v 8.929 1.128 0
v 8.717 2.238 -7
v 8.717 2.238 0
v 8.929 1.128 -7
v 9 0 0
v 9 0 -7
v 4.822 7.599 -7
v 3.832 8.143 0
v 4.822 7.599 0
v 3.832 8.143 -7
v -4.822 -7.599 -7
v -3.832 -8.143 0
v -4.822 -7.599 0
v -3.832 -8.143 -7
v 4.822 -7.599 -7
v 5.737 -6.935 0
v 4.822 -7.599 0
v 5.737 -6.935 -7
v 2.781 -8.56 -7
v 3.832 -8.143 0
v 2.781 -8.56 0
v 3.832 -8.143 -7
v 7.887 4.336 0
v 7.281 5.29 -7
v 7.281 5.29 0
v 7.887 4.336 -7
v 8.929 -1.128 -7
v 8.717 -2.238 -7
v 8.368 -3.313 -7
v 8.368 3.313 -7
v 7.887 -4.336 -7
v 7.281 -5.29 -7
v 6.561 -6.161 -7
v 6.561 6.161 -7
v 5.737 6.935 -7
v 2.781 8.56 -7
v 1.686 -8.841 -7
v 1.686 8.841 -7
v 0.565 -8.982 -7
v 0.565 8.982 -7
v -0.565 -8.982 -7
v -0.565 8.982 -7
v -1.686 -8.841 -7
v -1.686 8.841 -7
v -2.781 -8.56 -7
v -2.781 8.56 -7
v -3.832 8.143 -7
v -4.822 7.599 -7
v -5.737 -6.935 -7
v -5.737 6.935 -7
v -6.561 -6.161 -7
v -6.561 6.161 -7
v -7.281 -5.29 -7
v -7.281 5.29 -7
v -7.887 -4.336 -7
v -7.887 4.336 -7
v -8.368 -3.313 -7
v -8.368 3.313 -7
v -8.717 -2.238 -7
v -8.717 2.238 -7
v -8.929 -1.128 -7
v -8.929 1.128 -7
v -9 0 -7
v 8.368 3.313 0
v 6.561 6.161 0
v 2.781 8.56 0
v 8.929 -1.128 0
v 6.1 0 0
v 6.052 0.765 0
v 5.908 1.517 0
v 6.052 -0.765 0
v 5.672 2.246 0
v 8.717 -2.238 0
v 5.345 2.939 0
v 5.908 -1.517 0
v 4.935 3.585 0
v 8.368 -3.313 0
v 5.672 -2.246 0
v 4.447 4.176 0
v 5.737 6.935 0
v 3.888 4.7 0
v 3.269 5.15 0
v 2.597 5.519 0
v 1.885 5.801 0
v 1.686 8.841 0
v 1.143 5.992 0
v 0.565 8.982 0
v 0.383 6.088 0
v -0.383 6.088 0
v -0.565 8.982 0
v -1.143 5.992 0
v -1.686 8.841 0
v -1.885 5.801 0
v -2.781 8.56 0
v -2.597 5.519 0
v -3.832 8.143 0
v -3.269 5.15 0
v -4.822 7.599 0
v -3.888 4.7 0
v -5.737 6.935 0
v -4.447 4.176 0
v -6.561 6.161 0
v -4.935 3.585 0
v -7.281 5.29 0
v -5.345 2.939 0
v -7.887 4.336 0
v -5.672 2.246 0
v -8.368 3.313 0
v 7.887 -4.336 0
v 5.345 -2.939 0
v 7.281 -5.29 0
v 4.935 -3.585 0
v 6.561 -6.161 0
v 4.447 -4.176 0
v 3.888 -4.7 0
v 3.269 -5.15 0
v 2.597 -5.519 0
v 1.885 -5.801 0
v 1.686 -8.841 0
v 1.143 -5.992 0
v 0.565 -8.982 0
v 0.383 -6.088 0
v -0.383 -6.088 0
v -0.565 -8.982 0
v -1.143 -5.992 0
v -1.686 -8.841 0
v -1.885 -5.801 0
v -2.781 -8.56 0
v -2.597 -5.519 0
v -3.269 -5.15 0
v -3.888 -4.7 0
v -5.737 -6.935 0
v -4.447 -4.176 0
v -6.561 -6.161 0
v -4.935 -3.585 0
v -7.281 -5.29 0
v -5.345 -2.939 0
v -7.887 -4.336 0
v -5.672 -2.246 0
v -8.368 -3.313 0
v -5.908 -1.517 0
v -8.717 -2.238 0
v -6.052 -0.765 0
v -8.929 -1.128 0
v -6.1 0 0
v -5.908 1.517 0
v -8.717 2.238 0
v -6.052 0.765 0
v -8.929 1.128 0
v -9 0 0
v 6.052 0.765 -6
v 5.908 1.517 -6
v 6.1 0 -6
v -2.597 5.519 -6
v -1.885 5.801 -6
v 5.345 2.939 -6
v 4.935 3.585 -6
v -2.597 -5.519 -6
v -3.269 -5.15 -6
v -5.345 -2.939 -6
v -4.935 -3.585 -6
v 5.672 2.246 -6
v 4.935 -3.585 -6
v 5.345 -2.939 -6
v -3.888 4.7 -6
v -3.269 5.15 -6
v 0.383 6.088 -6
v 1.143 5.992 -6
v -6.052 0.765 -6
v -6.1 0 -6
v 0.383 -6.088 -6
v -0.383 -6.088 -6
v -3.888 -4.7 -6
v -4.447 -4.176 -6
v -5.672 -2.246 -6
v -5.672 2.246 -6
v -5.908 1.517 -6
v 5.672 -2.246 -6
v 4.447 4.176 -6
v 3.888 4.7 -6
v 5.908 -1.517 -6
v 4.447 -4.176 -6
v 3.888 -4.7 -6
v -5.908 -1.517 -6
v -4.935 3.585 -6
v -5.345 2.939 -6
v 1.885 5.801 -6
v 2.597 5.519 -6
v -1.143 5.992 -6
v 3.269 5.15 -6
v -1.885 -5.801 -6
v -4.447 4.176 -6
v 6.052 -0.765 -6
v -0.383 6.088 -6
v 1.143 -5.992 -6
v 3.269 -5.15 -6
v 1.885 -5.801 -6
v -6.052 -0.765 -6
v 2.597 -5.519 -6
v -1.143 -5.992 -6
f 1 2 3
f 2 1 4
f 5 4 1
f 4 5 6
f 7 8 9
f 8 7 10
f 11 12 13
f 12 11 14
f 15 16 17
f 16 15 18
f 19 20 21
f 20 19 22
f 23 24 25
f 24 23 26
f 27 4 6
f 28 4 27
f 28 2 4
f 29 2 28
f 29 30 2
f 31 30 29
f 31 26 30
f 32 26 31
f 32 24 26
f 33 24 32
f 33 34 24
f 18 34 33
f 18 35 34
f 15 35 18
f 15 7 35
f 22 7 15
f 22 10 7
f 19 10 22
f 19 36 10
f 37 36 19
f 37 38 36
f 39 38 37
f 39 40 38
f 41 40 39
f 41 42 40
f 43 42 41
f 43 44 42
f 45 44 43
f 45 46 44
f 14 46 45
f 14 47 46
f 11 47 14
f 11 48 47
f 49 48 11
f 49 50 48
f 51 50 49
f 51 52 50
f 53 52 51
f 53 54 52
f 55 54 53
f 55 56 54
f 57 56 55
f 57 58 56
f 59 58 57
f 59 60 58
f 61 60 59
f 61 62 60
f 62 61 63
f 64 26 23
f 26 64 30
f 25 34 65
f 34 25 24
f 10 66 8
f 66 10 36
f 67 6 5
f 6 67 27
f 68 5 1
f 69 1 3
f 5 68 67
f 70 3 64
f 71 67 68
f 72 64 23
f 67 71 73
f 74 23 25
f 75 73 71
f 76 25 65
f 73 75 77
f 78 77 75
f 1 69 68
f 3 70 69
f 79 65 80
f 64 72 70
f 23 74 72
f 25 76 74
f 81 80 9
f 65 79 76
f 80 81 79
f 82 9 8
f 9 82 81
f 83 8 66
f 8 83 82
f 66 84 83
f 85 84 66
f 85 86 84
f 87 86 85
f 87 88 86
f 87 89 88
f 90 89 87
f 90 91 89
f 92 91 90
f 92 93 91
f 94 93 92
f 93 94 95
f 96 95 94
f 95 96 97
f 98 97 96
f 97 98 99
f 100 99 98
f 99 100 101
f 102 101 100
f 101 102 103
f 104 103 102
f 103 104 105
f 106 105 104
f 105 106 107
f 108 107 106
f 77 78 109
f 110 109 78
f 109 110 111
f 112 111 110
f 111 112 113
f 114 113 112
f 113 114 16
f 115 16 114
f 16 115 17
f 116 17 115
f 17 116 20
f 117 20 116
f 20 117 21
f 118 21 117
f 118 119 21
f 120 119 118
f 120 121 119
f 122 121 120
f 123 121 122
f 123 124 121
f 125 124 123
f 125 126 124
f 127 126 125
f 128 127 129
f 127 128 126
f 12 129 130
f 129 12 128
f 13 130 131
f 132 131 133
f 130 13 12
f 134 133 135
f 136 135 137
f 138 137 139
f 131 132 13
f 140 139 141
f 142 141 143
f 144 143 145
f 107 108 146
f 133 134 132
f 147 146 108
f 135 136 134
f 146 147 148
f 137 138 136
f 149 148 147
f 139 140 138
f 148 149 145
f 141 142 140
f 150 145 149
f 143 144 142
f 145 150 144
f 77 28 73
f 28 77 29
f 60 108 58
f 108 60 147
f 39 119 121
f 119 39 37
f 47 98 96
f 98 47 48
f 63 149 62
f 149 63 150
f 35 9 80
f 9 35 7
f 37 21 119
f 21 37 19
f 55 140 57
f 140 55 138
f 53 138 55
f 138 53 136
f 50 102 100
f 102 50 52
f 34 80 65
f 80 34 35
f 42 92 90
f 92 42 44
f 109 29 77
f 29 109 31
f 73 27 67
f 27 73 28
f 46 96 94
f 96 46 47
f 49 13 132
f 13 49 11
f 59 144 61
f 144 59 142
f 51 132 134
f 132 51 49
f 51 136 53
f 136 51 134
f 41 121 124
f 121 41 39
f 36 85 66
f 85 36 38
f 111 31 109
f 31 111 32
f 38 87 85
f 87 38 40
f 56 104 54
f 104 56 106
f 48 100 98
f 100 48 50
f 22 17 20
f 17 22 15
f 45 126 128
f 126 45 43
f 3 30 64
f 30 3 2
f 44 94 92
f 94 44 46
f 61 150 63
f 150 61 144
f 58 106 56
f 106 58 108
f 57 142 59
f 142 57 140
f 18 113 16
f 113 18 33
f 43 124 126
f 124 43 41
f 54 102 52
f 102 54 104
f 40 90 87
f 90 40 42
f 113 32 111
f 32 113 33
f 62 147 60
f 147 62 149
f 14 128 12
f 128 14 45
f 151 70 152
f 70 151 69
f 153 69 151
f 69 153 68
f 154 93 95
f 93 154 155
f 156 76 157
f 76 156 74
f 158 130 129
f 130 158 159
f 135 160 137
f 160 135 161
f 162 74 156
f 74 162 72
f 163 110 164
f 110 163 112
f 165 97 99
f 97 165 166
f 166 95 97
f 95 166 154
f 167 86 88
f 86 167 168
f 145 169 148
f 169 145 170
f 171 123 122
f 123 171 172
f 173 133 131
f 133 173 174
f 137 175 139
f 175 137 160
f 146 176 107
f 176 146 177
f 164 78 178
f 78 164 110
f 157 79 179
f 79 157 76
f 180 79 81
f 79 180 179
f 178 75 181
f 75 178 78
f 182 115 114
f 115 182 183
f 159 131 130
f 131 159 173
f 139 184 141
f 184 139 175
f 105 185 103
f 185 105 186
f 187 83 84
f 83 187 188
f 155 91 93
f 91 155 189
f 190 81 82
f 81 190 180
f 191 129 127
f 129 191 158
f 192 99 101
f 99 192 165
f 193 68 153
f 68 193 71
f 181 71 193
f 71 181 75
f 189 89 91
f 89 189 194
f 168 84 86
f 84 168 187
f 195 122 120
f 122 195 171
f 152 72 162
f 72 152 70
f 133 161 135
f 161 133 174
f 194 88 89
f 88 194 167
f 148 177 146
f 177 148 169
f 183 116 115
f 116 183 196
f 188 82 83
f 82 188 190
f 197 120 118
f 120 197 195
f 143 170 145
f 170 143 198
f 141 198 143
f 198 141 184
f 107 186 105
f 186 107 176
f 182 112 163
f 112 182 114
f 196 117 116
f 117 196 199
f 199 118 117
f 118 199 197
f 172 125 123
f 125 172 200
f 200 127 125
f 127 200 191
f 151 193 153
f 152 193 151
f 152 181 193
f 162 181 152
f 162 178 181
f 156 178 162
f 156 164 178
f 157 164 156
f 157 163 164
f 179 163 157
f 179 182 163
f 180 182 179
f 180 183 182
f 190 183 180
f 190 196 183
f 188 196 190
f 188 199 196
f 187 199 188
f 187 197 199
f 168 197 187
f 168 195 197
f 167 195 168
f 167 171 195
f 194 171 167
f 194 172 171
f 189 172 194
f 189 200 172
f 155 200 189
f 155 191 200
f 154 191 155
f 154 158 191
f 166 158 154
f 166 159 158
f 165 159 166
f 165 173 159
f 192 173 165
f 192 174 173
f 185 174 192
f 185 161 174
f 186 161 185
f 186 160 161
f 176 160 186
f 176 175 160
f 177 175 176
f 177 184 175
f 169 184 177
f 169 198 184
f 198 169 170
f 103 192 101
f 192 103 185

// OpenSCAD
$fn = 50;


difference() {
	union() {
		translate(v = [0, 0, -7.0000000000]) {
			cylinder(h = 7, r = 9.0000000000);
		}
	}
	union() {
		#translate(v = [0, 0, -6.0000000000]) {
			cylinder(h = 6, r = 6.1000000000);
		}
	}
}
